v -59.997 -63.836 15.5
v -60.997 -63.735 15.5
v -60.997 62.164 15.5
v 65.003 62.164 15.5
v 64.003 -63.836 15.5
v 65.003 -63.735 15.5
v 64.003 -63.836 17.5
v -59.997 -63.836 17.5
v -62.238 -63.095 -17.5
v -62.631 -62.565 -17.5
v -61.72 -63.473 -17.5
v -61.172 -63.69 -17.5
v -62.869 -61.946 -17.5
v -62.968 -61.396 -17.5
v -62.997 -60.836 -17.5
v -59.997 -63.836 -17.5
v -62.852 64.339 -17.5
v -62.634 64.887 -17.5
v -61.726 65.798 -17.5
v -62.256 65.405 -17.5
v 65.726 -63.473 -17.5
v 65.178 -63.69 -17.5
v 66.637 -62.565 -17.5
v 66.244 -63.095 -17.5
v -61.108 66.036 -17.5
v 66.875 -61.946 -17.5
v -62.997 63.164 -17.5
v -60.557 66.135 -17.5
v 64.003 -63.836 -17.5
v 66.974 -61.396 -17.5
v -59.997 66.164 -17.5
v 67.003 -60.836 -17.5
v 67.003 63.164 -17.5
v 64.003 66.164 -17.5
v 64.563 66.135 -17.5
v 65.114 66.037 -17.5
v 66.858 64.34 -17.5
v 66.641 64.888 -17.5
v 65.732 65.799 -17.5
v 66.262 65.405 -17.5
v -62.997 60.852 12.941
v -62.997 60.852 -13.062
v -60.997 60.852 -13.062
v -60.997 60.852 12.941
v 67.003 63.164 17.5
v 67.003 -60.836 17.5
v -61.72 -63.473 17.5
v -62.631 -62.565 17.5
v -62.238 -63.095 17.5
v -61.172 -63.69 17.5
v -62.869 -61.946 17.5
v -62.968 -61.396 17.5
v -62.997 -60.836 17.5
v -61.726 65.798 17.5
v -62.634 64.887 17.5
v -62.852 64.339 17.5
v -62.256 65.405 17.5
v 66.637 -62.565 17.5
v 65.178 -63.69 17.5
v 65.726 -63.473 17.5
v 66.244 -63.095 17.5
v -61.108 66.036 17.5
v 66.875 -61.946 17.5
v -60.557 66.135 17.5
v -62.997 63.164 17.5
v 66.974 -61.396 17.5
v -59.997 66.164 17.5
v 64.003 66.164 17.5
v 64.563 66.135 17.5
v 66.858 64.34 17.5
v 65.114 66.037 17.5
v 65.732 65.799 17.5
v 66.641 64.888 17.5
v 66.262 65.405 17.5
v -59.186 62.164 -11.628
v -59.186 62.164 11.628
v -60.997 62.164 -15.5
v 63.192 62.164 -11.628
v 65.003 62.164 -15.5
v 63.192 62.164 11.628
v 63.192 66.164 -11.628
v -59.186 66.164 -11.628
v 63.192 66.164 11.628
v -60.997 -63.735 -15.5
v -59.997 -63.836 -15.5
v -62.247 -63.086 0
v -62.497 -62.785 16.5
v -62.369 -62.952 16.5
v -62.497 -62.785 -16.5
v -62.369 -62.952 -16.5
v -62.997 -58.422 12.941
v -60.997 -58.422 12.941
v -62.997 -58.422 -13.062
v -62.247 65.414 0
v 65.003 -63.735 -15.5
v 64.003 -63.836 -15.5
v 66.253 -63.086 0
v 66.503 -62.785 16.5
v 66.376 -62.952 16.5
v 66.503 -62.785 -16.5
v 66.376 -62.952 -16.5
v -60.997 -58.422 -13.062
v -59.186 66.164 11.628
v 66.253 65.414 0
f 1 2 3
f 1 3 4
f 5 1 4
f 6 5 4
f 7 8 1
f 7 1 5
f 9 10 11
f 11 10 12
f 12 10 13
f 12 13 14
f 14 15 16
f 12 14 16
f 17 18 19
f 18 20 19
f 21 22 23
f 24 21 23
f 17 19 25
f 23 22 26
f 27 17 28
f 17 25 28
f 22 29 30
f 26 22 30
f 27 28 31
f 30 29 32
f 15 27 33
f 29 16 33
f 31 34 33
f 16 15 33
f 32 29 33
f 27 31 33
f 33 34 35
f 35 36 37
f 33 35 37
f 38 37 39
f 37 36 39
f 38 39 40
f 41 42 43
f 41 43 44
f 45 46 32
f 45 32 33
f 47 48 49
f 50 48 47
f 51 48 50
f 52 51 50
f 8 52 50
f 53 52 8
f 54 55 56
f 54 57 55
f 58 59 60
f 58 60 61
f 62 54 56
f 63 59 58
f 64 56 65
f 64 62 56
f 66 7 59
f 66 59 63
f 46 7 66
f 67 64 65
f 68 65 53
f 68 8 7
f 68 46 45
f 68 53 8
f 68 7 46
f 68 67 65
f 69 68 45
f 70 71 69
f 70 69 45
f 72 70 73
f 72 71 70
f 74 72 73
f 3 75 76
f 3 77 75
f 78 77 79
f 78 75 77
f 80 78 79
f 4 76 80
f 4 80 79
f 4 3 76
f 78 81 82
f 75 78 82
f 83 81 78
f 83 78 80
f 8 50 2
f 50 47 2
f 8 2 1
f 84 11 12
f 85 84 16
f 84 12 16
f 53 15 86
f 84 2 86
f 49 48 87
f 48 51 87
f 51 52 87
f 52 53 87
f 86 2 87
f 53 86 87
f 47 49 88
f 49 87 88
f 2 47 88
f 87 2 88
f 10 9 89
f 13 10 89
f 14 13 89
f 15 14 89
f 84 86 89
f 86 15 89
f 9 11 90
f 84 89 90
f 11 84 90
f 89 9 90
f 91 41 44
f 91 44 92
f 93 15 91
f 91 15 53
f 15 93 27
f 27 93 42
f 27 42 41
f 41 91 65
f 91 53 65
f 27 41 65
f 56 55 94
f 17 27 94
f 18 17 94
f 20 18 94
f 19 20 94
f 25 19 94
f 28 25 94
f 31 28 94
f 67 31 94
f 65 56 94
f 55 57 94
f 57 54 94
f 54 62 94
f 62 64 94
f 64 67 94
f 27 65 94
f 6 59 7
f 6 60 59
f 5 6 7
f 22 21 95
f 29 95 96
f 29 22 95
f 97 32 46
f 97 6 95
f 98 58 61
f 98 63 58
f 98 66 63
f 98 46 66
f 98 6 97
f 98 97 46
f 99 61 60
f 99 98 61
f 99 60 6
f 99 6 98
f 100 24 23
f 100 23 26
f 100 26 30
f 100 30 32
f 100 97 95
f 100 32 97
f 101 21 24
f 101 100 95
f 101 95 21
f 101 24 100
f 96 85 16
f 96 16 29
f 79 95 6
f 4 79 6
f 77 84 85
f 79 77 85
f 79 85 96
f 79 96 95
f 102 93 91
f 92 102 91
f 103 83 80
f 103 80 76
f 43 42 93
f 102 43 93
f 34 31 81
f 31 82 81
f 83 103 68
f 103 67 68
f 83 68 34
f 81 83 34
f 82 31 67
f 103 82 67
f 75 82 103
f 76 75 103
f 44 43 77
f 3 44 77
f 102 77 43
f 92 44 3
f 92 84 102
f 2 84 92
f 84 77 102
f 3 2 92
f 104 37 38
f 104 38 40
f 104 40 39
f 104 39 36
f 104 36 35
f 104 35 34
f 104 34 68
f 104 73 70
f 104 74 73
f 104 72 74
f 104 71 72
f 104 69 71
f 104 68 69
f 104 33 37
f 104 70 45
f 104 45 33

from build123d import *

# Parameters (mm, degrees)
F0_W        = 130
F0_H        = 130
F1_DEPTH    = 17.5
F2_W        = 126
F2_H        = 31
F3_DEPTH    = 126
F5_W        = 122.3782406645
F5_H        = 23.2565429012
F6_DEPTH    = 7
F4_W        = 119.2743226562
F4_H        = 26.0036256061
F7_DEPTH    = 3
F8_T1_DEPTH = 50


# Not quite as in the source:
# - a fillet or chamfer that OpenCascade refuses, or shapes differently, is made with other operations: its cross-section is extruded or revolved along the edge and cut away or added


with BuildPart() as f1:
    # F0 (on Top) → F1 (new body, symmetric)
    with BuildSketch(Plane.XY):
        with Locations((2.0031377077, 1.1643140912)):
            Rectangle(F0_W, F0_H)
    extrude(amount=F1_DEPTH, both=True)

    # F2 (on face) → F3 (cut)
    with BuildSketch(Plane.XZ.offset(63.8356859088)):
        with Locations((2.0031377077, 0)):
            Rectangle(F2_W, F2_H)
    extrude(amount=-F3_DEPTH, mode=Mode.SUBTRACT)

    # F5 (on face) → F6 (cut)
    with BuildSketch(Plane(origin=(0, 66.1643140912, 0), x_dir=(-1, 0, 0), z_dir=(0, 1, 0))):
        with Locations((-2.0031377077, 0)):
            Rectangle(F5_W, F5_H)
    extrude(amount=-F6_DEPTH, mode=Mode.SUBTRACT)

    # F4 (on face) → F7 (cut)
    with BuildSketch(Plane(origin=(-62.9968622923, 0, 0), x_dir=(0, -1, 0), z_dir=(-1, 0, 0))):
        with Locations((-1.2152138836, -0.0606838628)):
            Rectangle(F4_W, F4_H)
    extrude(amount=-F7_DEPTH, mode=Mode.SUBTRACT)

    # F8: fillet of radius 3 on 4 edges, made by hand

    # F8_s2 → F8_t1 (cut)
    with BuildSketch(Plane.XY.offset(-25)):
        with BuildLine():
            add(Edge.make_bspline(
                [(-59.9968622923, 66.1643140912), (-62.9968622923, 66.1643140912), (-62.9968622923, 63.1643140912)],
                knots=[0, 0, 0, 1, 1, 1], degree=2, weights=[1, 1, 1]))
            Line((-62.9968622923, 63.1643140912), (-62.9968622923, 66.1643140912))
            Line((-62.9968622923, 66.1643140912), (-59.9968622923, 66.1643140912))
        make_face()
        with BuildLine():
            add(Edge.make_bspline(
                [(-62.9968622923, -60.8356859088), (-62.9968622923, -63.8356859088), (-59.9968622923, -63.8356859088)],
                knots=[0, 0, 0, 1, 1, 1], degree=2, weights=[1, 1, 1]))
            Line((-59.9968622923, -63.8356859088), (-62.9968622923, -63.8356859088))
            Line((-62.9968622923, -63.8356859088), (-62.9968622923, -60.8356859088))
        make_face()
        with BuildLine():
            add(Edge.make_bspline(
                [(64.0031377077, 66.1643140912), (67.0031377077, 66.1643140912), (67.0031377077, 63.1643140912)],
                knots=[0, 0, 0, 1, 1, 1], degree=2, weights=[1, 1, 1]))
            Line((67.0031377077, 63.1643140912), (67.0031377077, 66.1643140912))
            Line((67.0031377077, 66.1643140912), (64.0031377077, 66.1643140912))
        make_face()
        with BuildLine():
            add(Edge.make_bspline(
                [(67.0031377077, -60.8356859088), (67.0031377077, -63.8356859088), (64.0031377077, -63.8356859088)],
                knots=[0, 0, 0, 1, 1, 1], degree=2, weights=[1, 1, 1]))
            Line((64.0031377077, -63.8356859088), (67.0031377077, -63.8356859088))
            Line((67.0031377077, -63.8356859088), (67.0031377077, -60.8356859088))
        make_face()
    extrude(amount=F8_T1_DEPTH, mode=Mode.SUBTRACT)


solid = f1.part
